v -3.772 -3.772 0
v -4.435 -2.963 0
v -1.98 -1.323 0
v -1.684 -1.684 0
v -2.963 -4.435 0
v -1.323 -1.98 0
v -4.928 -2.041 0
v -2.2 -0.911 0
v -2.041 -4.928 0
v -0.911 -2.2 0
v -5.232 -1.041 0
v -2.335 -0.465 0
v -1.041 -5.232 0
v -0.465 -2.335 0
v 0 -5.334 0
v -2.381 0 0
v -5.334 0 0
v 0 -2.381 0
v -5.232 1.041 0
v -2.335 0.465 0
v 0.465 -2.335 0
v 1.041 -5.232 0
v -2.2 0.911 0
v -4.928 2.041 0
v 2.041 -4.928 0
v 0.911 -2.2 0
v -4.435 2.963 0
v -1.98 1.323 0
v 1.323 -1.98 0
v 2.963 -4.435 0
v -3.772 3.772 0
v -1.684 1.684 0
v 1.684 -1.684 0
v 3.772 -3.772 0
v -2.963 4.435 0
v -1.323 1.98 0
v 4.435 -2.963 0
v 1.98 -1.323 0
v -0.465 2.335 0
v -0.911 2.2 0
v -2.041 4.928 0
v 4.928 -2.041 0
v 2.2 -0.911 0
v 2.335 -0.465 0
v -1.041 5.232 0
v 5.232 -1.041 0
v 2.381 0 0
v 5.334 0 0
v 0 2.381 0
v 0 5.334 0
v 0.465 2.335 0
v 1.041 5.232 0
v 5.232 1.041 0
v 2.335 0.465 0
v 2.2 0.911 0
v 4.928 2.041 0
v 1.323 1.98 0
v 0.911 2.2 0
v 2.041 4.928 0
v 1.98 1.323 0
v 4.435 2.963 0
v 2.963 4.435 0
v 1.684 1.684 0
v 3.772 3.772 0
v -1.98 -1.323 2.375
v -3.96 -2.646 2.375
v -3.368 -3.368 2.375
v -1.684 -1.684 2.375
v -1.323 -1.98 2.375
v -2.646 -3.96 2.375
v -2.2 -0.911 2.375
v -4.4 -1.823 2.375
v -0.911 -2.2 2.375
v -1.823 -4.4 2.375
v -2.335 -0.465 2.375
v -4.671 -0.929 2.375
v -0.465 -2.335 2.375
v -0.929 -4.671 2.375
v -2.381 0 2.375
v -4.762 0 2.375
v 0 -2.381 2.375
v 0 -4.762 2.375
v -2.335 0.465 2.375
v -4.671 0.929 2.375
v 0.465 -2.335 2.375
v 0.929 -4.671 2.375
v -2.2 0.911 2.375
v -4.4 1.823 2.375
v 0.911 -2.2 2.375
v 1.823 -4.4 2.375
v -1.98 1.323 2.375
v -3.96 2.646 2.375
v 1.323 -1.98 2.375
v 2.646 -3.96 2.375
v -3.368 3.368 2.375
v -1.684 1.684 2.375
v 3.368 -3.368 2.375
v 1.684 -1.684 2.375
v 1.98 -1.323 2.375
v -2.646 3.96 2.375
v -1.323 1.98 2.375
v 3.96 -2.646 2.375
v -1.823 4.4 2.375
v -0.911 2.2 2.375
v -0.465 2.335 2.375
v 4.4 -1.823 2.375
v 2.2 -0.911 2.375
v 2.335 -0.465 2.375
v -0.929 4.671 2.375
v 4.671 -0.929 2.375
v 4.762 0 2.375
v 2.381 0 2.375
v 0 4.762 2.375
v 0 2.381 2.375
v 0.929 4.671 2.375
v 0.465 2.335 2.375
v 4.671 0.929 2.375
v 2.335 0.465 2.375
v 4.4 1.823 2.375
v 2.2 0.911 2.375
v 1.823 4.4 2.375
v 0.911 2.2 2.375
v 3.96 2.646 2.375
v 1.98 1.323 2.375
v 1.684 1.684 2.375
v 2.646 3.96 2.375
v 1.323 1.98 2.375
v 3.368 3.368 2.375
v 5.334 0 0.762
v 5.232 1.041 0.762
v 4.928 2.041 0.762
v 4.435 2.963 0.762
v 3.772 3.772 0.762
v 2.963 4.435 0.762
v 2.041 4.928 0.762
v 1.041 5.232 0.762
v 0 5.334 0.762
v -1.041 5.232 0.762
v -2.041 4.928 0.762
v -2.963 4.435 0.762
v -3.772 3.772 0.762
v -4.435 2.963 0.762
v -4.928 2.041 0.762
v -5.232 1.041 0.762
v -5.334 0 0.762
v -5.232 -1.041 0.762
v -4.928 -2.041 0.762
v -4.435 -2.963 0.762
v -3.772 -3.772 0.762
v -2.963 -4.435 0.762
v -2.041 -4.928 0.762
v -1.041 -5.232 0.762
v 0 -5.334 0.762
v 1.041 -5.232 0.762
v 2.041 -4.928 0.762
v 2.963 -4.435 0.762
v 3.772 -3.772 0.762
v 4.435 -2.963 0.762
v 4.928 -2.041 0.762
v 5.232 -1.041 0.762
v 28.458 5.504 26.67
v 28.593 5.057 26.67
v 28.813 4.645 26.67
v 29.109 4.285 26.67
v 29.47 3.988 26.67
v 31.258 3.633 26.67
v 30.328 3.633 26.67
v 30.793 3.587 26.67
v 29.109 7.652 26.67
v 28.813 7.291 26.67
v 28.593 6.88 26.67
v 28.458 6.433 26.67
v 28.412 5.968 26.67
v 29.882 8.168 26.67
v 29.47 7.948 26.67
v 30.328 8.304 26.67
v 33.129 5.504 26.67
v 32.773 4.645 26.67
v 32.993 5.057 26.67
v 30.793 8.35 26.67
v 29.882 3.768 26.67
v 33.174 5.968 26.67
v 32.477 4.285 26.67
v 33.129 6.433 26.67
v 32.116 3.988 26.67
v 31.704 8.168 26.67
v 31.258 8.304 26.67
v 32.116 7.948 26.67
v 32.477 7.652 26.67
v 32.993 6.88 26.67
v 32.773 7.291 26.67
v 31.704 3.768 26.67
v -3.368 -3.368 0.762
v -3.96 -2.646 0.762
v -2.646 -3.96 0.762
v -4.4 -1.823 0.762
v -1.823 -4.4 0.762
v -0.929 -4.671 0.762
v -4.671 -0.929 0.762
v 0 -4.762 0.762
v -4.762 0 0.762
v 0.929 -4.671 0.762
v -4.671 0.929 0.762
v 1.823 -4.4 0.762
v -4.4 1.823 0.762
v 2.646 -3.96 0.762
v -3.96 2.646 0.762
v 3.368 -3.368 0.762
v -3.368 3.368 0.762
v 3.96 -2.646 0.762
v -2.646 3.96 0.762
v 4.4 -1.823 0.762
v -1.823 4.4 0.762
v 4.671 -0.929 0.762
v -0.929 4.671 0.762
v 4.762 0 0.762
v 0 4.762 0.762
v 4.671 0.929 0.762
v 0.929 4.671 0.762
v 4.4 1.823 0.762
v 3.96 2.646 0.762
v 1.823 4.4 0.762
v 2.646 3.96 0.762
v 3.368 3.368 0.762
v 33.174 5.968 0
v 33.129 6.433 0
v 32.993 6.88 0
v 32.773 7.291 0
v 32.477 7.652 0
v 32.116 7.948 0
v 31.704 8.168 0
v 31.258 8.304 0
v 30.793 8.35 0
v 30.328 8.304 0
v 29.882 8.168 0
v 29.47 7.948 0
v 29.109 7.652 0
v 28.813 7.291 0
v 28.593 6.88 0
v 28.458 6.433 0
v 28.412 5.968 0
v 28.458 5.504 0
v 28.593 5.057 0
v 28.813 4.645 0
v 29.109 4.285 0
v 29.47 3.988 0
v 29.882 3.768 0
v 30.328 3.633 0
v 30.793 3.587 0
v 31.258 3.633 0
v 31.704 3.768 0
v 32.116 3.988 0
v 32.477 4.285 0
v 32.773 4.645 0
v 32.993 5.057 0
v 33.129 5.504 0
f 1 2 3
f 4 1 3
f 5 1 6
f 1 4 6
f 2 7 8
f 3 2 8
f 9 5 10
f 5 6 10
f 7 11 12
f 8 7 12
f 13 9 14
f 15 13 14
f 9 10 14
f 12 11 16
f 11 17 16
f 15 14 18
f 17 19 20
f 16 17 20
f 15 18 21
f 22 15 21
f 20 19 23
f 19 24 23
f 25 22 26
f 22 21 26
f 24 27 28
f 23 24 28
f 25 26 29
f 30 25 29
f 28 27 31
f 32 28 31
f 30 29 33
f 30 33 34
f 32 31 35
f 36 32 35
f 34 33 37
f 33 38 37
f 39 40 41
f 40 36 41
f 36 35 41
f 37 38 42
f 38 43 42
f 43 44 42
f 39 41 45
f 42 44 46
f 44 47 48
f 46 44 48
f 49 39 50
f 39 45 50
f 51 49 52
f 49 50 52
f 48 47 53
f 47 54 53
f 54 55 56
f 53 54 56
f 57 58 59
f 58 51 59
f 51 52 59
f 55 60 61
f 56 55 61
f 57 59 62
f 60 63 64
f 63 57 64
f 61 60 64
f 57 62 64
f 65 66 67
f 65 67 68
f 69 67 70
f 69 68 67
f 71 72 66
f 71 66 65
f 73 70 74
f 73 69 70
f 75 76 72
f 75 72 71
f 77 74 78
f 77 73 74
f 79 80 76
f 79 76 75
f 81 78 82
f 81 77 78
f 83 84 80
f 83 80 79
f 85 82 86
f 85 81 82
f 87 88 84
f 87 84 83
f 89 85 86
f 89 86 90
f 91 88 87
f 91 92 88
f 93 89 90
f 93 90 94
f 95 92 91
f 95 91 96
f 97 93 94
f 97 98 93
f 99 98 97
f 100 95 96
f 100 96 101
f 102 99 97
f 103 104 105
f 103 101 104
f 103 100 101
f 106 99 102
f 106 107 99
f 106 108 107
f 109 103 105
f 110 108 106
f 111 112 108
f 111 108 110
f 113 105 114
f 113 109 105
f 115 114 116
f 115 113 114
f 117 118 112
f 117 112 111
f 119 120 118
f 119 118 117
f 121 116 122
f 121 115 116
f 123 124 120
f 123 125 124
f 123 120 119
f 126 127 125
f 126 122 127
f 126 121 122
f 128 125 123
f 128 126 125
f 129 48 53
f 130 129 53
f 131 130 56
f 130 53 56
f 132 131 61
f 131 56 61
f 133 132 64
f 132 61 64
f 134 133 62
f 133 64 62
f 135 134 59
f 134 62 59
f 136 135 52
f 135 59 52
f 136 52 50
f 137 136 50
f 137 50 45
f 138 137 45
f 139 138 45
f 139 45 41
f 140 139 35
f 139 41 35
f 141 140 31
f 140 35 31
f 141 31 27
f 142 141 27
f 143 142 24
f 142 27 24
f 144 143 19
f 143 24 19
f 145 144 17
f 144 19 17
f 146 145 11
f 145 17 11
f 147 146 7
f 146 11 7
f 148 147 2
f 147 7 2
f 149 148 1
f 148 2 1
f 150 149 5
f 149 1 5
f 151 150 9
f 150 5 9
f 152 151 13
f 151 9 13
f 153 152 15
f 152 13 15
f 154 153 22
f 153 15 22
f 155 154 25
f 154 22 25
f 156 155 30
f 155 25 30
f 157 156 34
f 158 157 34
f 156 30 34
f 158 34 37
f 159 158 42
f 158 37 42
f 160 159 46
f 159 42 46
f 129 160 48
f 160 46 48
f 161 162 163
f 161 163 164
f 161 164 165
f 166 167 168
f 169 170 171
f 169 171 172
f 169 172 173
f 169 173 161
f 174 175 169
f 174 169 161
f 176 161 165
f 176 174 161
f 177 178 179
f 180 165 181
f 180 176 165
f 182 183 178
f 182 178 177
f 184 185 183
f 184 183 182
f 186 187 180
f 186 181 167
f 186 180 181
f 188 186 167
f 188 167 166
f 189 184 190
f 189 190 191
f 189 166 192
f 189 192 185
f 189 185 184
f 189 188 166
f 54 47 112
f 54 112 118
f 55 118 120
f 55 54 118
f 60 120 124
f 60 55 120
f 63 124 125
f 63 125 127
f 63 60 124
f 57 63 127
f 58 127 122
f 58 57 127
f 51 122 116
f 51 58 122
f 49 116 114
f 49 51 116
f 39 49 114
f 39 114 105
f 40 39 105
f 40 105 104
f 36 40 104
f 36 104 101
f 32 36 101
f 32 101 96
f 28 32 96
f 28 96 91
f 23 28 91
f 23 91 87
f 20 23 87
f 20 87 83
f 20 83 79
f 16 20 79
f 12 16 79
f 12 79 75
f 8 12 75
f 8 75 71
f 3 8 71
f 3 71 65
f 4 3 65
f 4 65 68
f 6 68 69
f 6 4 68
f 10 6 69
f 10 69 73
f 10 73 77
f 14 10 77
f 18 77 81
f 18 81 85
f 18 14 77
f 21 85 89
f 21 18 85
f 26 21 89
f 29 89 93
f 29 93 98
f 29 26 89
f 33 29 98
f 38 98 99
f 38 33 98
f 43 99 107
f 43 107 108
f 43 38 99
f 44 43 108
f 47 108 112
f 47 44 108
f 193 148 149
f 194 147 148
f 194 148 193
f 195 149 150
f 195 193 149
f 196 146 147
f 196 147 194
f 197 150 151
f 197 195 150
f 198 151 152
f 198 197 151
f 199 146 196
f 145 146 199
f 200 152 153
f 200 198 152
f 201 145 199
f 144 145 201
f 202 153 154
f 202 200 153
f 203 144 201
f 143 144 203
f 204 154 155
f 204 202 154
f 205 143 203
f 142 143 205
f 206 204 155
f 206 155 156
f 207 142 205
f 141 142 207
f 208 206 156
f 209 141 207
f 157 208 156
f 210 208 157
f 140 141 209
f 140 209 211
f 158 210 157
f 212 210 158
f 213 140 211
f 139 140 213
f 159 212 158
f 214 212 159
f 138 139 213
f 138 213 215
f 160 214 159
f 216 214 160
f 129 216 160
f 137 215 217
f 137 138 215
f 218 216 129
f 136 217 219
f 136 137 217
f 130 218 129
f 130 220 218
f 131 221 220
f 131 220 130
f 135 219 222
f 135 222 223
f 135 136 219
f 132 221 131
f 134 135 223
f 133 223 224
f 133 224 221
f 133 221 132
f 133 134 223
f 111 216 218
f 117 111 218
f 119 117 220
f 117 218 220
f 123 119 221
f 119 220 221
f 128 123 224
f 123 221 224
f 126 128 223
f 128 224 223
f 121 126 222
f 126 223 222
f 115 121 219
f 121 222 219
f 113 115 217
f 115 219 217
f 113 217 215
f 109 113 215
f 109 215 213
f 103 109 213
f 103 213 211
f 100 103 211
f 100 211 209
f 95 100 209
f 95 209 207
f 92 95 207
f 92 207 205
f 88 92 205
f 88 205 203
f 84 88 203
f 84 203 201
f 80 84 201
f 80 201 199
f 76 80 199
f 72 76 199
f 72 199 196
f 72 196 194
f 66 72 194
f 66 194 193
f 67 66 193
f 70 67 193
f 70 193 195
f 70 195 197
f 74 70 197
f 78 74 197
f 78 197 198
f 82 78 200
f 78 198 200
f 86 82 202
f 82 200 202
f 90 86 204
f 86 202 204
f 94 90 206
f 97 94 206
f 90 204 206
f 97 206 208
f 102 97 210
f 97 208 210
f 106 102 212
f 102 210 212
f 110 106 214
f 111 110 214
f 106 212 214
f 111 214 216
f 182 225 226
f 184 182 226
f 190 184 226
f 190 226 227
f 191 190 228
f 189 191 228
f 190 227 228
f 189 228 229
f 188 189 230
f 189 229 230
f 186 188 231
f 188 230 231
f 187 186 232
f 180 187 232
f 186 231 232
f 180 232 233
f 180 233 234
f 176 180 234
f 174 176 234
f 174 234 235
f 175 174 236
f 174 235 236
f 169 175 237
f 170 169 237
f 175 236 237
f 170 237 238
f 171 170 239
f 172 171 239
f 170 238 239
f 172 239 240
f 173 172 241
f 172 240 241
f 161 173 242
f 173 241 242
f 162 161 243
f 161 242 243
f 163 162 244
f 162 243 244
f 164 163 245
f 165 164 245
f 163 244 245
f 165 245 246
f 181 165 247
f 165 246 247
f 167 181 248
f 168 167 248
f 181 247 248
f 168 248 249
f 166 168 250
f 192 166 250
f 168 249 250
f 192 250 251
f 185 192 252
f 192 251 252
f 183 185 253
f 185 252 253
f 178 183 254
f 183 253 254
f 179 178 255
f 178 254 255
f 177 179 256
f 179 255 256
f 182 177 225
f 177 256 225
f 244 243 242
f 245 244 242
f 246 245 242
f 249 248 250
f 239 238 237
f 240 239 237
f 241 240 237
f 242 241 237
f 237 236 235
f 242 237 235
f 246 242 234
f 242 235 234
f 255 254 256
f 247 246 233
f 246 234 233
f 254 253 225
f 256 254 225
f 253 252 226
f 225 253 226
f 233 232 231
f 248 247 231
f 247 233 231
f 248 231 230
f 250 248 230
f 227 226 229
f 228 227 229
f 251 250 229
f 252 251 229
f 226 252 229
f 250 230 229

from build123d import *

# Parameters (mm, degrees)
F0_R     = 5.334
F0_R_2   = 2.38125
F1_DEPTH = 0.762
F2_R     = 4.7625
F2_R_2   = 2.38125
F3_DEPTH = 2.3749
F4_R     = 2.38125
F5_DEPTH = 26.67


with BuildPart() as f1:
    # F0 (on Top) → F1 (new body)
    with BuildSketch(Plane.XY):
        Circle(F0_R)
        Circle(F0_R_2, mode=Mode.SUBTRACT)
    extrude(amount=F1_DEPTH)

    # F2 (on Top) → F3 (join)
    with BuildSketch(Plane.XY):
        Circle(F2_R)
        Circle(F2_R_2, mode=Mode.SUBTRACT)
    extrude(amount=F3_DEPTH)


with BuildPart() as f5:
    # F4 (on Top) → F5 (new body)
    with BuildSketch(Plane.XY):
        with Locations((30.793037, 5.968314)):
            Circle(F4_R)
    extrude(amount=F5_DEPTH)


solid = Compound([f1.part, f5.part])
